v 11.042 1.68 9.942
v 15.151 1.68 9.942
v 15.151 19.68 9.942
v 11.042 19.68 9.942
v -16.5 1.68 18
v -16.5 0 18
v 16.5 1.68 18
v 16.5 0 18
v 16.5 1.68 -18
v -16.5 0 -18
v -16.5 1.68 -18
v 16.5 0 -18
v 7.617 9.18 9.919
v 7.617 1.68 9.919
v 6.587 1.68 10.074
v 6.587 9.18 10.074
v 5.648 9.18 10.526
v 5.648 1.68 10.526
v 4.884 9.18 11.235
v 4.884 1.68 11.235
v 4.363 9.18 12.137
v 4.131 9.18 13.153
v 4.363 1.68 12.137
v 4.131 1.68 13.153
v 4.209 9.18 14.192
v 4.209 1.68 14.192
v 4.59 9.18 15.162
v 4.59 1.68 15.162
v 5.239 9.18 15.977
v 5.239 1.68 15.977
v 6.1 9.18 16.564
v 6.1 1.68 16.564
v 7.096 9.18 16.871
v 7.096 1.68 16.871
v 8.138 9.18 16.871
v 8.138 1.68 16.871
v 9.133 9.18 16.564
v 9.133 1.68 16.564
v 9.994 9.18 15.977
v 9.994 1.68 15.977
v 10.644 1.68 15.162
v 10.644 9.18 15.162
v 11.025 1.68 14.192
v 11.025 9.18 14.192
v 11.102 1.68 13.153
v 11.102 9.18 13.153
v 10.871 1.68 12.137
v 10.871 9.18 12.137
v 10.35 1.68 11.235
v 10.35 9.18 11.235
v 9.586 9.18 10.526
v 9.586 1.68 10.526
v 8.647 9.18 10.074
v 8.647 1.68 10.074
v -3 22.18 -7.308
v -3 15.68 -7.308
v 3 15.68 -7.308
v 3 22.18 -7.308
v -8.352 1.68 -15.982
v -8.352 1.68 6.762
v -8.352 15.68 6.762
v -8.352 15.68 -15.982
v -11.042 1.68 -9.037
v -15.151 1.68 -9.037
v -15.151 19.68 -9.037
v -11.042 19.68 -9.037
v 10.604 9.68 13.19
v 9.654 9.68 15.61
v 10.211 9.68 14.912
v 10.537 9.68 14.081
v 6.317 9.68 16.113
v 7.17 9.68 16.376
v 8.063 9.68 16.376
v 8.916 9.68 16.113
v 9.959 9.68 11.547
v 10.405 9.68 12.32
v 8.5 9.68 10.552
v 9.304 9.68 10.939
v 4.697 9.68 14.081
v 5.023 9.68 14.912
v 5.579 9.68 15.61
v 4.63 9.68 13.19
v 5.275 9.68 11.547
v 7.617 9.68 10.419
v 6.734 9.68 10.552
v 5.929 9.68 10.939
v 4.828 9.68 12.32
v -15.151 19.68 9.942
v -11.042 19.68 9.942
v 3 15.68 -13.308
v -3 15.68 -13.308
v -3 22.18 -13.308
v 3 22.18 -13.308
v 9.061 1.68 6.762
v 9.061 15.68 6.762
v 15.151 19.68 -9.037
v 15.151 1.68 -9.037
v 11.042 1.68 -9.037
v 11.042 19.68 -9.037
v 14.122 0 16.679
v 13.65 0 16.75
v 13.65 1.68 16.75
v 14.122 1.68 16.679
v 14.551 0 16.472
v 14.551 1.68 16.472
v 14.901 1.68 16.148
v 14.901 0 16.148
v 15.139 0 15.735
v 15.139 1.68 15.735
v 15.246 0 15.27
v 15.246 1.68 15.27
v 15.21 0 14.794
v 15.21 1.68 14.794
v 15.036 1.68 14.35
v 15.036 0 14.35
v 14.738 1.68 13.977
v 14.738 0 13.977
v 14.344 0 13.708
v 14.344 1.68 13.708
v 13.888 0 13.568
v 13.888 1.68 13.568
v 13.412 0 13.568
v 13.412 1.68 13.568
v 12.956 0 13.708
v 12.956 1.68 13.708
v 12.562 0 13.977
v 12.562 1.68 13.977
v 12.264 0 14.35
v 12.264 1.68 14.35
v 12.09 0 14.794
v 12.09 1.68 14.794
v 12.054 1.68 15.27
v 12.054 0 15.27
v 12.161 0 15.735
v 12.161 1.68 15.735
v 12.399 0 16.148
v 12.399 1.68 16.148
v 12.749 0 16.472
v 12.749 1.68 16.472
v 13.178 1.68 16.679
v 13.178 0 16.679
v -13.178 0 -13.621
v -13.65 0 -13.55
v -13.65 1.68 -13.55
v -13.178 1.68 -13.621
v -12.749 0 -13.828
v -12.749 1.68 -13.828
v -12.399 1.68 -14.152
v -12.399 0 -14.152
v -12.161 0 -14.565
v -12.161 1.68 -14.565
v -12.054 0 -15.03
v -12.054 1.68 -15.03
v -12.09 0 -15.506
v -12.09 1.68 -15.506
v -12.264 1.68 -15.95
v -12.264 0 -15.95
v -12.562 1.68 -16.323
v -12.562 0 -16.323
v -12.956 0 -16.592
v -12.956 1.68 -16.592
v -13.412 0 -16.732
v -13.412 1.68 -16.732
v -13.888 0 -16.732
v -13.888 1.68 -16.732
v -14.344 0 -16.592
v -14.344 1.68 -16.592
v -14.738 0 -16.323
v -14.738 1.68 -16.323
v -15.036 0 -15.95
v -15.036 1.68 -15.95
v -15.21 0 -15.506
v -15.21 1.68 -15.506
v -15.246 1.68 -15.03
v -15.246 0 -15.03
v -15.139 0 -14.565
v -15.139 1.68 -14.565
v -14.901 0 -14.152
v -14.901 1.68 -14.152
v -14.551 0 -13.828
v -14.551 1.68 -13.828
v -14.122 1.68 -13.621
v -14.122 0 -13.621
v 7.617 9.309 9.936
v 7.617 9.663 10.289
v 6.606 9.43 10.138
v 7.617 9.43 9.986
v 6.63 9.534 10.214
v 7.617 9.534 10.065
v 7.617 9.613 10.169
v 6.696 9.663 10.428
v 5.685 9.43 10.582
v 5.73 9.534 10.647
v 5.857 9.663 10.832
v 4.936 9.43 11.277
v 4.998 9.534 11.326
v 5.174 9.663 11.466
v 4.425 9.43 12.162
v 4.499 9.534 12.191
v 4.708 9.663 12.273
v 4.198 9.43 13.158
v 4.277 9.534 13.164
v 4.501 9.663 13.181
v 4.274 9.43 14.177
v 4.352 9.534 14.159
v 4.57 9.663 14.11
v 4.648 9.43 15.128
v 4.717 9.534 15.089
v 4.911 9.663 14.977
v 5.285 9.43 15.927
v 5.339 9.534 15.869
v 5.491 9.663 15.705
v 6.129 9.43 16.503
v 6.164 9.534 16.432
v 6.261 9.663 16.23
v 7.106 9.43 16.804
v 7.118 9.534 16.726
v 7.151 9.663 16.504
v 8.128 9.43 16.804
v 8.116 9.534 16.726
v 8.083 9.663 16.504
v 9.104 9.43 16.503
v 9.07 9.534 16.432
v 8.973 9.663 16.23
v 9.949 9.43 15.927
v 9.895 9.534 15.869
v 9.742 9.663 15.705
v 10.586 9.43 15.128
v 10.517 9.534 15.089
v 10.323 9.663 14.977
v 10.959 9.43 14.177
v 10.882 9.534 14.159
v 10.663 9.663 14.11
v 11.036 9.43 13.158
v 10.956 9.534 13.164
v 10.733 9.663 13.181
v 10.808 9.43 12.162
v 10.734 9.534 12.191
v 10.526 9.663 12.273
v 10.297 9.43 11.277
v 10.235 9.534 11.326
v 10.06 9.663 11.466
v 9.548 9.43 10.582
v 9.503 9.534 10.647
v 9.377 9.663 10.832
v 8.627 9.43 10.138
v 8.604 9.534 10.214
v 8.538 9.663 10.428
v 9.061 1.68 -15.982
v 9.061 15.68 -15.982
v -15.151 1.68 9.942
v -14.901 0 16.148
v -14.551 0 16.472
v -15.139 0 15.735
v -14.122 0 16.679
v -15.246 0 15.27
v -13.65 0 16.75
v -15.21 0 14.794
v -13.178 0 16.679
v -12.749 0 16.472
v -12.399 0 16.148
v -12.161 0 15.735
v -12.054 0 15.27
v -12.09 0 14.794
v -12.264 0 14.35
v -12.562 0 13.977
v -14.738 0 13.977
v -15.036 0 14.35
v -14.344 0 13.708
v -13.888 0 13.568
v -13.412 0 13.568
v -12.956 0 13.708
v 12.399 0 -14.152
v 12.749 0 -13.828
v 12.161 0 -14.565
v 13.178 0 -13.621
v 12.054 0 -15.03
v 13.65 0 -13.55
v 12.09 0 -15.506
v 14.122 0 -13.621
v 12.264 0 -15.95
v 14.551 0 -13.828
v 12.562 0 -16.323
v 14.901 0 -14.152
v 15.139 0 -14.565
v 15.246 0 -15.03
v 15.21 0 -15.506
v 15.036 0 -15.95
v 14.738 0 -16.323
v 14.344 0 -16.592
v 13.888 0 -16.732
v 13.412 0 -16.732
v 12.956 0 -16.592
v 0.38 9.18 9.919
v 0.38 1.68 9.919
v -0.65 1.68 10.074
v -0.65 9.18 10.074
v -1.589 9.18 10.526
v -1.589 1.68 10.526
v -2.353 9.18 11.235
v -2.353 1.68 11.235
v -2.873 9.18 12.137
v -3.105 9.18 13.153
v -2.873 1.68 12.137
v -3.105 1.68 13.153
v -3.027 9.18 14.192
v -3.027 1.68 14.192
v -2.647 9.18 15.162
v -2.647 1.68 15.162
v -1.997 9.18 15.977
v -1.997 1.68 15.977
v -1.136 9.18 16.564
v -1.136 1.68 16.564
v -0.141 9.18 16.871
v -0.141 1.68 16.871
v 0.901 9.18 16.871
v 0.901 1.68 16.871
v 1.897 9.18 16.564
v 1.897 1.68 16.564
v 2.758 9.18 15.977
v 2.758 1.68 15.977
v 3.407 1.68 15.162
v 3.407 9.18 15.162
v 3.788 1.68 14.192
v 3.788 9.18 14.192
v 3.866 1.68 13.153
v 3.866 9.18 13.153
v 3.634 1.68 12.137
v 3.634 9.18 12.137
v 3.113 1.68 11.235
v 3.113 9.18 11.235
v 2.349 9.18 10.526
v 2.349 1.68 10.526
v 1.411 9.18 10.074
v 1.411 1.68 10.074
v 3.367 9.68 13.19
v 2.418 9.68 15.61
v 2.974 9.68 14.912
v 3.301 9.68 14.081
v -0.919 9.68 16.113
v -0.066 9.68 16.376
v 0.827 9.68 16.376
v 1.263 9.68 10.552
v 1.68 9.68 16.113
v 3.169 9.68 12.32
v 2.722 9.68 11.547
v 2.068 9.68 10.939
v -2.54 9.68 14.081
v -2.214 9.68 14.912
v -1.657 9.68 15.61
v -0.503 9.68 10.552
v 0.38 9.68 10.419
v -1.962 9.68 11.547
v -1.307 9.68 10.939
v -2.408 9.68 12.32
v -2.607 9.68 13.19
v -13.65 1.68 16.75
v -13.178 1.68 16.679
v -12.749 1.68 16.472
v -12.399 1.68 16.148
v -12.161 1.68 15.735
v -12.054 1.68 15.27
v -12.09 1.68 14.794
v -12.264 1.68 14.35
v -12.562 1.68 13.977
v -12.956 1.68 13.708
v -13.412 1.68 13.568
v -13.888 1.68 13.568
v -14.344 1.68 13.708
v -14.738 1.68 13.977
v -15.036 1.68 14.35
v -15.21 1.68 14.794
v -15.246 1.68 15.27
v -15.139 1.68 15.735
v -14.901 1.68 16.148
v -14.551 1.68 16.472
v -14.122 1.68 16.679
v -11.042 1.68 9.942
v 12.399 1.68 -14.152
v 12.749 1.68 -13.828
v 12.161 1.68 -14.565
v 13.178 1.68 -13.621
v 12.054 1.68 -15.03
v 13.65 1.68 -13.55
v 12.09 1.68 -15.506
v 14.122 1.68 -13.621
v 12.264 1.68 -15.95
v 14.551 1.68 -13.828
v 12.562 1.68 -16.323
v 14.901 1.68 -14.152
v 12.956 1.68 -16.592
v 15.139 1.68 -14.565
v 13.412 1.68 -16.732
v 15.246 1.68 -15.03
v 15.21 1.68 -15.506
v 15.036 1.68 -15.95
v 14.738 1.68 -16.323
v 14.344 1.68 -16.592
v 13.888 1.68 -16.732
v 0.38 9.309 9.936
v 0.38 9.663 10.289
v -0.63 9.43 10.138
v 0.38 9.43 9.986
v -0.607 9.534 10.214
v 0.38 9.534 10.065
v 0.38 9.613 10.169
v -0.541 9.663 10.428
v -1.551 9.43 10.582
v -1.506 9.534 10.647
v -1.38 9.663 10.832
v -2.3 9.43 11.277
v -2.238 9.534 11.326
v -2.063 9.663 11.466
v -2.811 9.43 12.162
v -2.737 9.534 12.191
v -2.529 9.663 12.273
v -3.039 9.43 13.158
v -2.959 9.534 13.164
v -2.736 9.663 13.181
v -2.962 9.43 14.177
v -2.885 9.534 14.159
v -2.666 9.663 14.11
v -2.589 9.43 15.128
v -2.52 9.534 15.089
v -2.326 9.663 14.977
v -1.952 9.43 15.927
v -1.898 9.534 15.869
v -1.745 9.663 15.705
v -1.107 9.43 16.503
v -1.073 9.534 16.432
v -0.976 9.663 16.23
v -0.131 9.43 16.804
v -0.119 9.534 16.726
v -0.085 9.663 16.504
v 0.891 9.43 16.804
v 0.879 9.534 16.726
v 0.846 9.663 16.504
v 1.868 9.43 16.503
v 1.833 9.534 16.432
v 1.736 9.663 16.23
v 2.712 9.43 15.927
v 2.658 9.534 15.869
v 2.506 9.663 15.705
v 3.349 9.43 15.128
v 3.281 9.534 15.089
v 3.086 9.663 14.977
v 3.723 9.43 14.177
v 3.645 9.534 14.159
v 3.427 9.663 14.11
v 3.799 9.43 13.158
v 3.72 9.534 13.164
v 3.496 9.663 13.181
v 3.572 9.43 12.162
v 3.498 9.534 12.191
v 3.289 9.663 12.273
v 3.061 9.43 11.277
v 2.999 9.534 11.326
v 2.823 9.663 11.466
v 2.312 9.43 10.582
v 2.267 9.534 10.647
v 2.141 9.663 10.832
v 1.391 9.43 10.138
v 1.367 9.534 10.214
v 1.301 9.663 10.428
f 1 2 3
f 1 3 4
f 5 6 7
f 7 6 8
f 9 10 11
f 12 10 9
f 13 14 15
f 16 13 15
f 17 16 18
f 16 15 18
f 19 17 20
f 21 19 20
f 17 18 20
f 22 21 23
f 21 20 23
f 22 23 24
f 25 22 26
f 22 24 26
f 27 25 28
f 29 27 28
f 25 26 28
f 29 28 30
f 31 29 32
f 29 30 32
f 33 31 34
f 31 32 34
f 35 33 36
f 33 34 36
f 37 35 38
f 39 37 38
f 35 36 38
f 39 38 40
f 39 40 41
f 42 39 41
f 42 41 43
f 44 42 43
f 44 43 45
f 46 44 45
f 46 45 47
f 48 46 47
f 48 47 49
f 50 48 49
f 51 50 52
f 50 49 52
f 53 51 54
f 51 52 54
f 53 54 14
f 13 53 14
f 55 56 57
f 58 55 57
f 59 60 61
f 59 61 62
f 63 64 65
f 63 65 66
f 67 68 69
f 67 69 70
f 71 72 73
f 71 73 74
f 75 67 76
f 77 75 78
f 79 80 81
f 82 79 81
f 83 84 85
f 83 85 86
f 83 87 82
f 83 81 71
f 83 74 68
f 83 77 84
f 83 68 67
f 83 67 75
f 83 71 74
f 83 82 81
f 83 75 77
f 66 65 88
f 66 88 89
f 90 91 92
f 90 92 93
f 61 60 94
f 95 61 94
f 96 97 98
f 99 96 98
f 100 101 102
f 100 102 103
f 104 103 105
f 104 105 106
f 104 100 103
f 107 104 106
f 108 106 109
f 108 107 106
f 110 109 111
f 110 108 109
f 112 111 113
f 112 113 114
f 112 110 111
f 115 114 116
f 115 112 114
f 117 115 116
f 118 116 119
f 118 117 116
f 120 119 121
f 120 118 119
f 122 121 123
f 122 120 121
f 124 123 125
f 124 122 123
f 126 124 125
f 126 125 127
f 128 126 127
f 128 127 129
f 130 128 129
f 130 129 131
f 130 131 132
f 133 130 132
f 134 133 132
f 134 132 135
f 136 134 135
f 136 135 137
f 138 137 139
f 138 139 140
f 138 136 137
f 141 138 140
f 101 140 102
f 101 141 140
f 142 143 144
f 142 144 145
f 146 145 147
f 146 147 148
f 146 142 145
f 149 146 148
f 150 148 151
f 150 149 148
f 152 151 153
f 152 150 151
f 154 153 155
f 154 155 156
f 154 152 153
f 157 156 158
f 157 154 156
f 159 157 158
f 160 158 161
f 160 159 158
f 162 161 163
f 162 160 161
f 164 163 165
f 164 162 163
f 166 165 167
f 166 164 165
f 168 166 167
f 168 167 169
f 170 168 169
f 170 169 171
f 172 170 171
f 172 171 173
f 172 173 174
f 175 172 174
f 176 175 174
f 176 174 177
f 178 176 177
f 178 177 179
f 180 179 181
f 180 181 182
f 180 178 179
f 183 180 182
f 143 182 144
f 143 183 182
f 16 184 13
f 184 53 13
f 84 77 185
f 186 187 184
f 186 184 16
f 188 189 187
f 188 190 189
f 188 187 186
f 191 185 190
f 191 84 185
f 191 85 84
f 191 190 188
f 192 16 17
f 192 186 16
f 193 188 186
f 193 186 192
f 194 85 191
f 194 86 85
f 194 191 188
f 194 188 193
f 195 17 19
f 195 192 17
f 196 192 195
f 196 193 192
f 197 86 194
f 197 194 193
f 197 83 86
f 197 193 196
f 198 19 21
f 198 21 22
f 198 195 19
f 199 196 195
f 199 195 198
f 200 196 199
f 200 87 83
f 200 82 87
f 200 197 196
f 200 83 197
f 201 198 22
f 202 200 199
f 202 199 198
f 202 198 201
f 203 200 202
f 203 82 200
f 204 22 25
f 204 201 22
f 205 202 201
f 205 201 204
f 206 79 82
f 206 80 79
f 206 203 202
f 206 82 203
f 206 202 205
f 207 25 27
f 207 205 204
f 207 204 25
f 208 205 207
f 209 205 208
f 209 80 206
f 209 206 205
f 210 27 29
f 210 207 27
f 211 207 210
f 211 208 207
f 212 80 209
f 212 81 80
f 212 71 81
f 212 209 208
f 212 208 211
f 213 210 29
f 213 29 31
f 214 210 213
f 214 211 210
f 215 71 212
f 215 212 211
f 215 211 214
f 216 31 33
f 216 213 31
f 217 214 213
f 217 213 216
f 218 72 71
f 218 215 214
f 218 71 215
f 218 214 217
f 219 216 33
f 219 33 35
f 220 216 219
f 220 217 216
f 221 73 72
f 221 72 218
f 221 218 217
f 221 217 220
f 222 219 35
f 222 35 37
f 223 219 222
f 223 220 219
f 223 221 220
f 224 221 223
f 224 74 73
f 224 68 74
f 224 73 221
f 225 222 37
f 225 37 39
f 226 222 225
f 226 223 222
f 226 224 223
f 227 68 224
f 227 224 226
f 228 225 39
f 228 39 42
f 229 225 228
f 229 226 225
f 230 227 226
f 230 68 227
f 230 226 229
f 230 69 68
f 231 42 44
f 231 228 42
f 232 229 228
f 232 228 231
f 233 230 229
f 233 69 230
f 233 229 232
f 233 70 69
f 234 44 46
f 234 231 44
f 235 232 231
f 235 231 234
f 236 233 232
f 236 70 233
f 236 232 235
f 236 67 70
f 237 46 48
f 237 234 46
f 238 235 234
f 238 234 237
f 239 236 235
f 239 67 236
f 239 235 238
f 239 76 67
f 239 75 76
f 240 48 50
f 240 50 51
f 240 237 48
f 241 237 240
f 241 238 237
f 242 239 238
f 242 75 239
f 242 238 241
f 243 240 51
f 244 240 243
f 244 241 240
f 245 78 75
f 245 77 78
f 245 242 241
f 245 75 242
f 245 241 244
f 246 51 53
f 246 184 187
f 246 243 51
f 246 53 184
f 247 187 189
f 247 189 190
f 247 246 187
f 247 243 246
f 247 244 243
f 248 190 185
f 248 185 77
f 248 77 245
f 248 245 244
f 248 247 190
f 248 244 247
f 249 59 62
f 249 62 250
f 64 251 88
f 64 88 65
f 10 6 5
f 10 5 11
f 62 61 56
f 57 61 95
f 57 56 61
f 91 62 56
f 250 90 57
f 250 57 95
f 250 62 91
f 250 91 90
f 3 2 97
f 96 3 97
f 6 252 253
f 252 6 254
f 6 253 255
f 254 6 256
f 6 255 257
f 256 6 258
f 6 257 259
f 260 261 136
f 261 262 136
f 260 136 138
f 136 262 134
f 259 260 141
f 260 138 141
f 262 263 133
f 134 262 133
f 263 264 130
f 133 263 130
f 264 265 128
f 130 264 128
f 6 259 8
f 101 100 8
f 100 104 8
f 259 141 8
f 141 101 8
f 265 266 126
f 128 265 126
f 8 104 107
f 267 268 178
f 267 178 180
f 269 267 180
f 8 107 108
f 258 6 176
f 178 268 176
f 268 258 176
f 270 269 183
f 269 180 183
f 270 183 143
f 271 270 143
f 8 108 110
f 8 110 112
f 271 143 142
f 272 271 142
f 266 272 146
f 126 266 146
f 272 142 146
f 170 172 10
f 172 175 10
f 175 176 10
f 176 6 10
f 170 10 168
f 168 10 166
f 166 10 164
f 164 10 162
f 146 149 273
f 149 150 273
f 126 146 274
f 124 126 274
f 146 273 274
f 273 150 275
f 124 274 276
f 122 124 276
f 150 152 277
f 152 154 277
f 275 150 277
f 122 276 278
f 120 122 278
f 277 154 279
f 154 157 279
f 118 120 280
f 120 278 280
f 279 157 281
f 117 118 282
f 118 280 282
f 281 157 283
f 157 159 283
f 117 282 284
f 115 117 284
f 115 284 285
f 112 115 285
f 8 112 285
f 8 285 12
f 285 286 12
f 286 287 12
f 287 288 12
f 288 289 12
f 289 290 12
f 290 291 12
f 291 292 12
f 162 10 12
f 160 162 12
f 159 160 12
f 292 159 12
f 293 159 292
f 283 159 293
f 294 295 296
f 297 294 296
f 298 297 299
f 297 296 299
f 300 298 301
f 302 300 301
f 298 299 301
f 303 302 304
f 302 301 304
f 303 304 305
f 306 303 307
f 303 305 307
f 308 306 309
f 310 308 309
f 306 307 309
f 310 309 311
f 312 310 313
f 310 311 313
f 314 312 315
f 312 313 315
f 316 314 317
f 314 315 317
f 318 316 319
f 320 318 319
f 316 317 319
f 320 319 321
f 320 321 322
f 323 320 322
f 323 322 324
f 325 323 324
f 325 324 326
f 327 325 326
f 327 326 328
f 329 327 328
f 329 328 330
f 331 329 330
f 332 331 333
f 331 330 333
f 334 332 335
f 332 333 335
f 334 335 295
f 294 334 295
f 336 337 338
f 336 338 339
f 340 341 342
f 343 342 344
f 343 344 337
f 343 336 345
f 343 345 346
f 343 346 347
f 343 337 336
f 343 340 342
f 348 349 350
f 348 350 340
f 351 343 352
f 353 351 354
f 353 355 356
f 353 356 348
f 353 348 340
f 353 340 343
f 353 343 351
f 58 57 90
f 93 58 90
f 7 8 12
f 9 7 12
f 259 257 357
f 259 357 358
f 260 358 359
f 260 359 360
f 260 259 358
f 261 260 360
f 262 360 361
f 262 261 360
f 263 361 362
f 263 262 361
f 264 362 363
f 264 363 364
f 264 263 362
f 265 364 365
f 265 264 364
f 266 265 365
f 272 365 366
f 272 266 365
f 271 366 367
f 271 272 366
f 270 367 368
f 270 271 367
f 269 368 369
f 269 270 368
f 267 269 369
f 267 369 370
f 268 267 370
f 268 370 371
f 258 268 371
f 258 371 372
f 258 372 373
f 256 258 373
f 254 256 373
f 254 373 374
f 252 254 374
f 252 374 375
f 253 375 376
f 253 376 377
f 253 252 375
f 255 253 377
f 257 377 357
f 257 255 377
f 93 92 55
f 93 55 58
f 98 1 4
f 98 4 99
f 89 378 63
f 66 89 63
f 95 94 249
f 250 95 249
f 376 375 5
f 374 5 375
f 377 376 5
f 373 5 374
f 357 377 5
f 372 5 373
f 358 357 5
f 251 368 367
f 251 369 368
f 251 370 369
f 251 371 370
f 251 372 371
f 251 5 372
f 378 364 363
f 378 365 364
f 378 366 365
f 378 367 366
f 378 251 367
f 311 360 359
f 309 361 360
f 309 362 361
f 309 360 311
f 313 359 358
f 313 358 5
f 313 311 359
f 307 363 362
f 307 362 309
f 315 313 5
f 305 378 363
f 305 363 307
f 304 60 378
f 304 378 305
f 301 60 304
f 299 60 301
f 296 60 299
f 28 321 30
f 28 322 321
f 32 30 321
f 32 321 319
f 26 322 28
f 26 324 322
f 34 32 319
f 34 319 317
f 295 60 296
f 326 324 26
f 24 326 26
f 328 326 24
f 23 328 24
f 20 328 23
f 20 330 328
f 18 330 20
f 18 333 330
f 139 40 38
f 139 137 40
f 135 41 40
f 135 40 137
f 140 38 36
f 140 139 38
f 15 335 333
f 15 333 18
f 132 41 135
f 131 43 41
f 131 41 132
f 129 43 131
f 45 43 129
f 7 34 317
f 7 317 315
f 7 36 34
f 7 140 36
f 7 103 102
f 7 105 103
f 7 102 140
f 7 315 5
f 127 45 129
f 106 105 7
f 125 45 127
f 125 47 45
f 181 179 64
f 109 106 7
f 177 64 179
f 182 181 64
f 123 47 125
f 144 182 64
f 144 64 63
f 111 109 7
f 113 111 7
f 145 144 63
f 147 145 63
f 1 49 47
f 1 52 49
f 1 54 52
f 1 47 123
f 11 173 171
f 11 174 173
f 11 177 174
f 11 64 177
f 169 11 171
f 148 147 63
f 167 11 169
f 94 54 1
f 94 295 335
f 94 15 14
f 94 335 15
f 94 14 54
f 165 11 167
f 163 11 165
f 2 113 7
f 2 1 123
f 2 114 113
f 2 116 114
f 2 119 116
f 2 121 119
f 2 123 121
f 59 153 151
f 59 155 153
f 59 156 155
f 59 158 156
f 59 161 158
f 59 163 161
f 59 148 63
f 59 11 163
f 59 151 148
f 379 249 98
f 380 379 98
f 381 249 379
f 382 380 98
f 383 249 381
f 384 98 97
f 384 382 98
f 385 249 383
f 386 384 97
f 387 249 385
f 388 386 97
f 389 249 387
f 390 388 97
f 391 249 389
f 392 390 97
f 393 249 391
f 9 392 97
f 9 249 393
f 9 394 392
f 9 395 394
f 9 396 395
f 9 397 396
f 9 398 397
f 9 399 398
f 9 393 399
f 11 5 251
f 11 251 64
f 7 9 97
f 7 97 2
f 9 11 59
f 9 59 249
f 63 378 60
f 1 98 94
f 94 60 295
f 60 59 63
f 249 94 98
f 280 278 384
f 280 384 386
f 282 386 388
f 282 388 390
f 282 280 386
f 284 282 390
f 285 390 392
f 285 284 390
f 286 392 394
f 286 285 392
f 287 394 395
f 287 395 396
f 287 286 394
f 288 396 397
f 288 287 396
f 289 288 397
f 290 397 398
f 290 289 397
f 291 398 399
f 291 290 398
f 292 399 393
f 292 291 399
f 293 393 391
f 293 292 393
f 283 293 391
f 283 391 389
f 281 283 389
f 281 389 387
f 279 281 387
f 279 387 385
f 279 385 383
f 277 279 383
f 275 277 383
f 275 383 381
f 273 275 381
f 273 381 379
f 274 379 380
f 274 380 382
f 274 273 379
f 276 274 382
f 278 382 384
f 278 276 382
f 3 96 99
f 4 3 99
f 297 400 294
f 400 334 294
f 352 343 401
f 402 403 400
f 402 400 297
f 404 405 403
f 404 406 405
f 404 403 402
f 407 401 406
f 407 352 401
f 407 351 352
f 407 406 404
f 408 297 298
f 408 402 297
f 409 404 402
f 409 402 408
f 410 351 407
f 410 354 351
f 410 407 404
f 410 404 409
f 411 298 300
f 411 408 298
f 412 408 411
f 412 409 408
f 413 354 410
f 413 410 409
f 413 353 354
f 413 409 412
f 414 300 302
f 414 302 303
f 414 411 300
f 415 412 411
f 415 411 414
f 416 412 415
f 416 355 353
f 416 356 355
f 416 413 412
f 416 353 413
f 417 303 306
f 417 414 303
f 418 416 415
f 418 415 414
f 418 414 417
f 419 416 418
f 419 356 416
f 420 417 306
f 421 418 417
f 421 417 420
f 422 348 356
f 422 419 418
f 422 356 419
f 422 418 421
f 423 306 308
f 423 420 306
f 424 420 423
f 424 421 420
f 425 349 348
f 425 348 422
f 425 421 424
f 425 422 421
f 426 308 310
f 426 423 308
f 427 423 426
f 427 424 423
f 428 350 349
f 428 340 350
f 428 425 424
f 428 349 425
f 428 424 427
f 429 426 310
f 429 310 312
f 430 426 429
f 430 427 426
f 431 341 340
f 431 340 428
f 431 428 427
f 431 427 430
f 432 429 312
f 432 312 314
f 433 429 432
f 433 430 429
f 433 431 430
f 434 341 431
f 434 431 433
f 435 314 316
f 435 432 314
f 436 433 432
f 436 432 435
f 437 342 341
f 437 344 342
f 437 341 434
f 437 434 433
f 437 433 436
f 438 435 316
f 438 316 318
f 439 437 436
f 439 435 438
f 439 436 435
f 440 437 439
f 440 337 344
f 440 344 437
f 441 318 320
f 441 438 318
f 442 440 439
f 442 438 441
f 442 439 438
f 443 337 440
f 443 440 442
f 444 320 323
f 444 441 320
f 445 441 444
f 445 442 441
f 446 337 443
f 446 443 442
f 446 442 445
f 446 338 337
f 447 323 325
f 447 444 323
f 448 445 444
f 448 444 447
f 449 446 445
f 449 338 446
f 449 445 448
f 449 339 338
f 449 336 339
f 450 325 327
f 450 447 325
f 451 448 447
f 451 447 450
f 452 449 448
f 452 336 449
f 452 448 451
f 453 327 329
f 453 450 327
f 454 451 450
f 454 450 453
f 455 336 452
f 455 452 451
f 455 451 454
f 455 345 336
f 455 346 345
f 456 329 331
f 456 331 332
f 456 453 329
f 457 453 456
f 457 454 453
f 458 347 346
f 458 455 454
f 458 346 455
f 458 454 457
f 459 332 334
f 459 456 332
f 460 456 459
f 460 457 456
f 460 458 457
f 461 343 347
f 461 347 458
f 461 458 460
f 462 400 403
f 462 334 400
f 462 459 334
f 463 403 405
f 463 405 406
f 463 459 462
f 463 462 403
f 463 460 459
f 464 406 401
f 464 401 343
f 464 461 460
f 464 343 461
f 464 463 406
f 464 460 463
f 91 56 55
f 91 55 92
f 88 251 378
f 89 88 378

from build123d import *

# Parameters (mm, degrees)
SKETCH1_W           = 33
SKETCH1_H           = 36
SKETCH1_R           = 1.6
BOSS_EXTRUDE1_DEPTH = 1.68
SKETCH2_W           = 17.413087774
SKETCH2_H           = 22.744623076
BOSS_EXTRUDE2_DEPTH = 14
SKETCH3_W           = 6
SKETCH3_H           = 6
BOSS_EXTRUDE3_DEPTH = 6.5
SKETCH4_W           = 4.108706104
SKETCH4_H           = 18.978309146
BOSS_EXTRUDE4_DEPTH = 18
SKETCH5_R           = 3.495385022
BOSS_EXTRUDE5_DEPTH = 8
FILLET1_R           = 0.5


with BuildPart() as part:
    # Sketch1 → Boss-Extrude1 (new body)
    with BuildSketch(Plane(origin=(0, 0, 0), x_dir=(1, 0, 0), z_dir=(0, 1, 0))):
        Rectangle(SKETCH1_W, SKETCH1_H)
        with Locations(Location((-13.65, 15.15, 0), (0, 0, 270))):
            Circle(SKETCH1_R, mode=Mode.SUBTRACT)
        with Locations(Location((13.65, 15.15, 0), (0, 0, 270))):
            Circle(SKETCH1_R, mode=Mode.SUBTRACT)
        with Locations(Location((13.65, -15.15, 0), (0, 0, 270))):
            Circle(SKETCH1_R, mode=Mode.SUBTRACT)
        with Locations(Location((-13.65, -15.15, 0), (0, 0, 270))):
            Circle(SKETCH1_R, mode=Mode.SUBTRACT)
    extrude(amount=BOSS_EXTRUDE1_DEPTH)

    # Sketch2 → Boss-Extrude2 (add)
    with BuildSketch(Plane(origin=(0, 1.68, 0), x_dir=(1, 0, 0), z_dir=(0, 1, 0))):
        with Locations((0.354620467, 4.610066075)):
            Rectangle(SKETCH2_W, SKETCH2_H)
    extrude(amount=BOSS_EXTRUDE2_DEPTH)

    # Sketch3 → Boss-Extrude3 (add)
    with BuildSketch(Plane(origin=(0, 15.68, 0), x_dir=(1, 0, 0), z_dir=(0, 1, 0))):
        with Locations((0, 10.308450136)):
            Rectangle(SKETCH3_W, SKETCH3_H)
    extrude(amount=BOSS_EXTRUDE3_DEPTH)

    # Sketch4 → Boss-Extrude4 (add)
    with BuildSketch(Plane(origin=(0, 1.68, 0), x_dir=(1, 0, 0), z_dir=(0, 1, 0))):
        with Locations((-13.096500706, -0.452446803)):
            Rectangle(SKETCH4_W, SKETCH4_H)
    boss_extrude4 = extrude(amount=BOSS_EXTRUDE4_DEPTH)

    # Mirror1: Boss-Extrude4 across plane
    add(boss_extrude4.mirror(Plane(origin=(0, 0, 0), x_dir=(0, 0, 1), z_dir=(1, 0, 0))))

    # Sketch5 → Boss-Extrude5 (add)
    with BuildSketch(Plane(origin=(0, 1.68, 0), x_dir=(1, 0, 0), z_dir=(0, 1, 0))):
        with Locations(Location((7.61678506, -13.414271653, 0), (0, 0, 90))):
            Circle(SKETCH5_R)
        with Locations(Location((0.380282147, -13.414271653, 0), (0, 0, 90))):
            Circle(SKETCH5_R)
    extrude(amount=BOSS_EXTRUDE5_DEPTH)

    # Fillet1
    fillet1_edges = [part.edges().sort_by_distance(p)[0] for p in [
        (7.61678506, 9.68, 16.909656675),
        (0.380282147, 9.68, 16.909656675),
    ]]
    fillet(fillet1_edges, radius=FILLET1_R)


solid = part.part
